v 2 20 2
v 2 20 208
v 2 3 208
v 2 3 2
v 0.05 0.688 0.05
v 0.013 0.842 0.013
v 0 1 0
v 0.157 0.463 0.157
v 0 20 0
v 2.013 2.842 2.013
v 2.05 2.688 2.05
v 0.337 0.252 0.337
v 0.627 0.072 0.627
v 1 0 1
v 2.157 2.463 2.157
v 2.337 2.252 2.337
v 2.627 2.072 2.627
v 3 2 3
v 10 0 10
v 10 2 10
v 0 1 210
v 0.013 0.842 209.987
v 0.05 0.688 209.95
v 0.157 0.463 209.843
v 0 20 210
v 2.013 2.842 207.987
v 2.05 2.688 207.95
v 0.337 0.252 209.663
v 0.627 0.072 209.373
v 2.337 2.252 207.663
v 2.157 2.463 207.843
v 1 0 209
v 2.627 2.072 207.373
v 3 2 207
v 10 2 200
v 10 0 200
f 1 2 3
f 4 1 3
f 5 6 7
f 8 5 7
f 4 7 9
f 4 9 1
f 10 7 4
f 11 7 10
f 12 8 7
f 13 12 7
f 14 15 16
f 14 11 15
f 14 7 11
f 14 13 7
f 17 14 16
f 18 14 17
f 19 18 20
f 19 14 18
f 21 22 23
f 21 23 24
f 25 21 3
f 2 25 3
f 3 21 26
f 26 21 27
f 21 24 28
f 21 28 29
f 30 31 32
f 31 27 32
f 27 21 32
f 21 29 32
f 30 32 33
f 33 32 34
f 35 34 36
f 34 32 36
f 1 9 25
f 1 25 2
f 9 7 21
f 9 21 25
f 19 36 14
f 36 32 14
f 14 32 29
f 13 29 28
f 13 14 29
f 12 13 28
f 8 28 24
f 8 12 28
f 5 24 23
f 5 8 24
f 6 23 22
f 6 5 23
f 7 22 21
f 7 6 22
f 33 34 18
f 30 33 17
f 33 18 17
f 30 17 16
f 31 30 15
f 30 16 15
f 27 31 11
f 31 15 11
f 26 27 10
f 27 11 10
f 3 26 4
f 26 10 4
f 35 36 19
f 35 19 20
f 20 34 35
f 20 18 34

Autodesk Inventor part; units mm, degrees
ref_plane "YZ Plane" through (0, 0, 0) normal (1, 0, 0) x (0, 1, 0)
ref_plane "XZ Plane" through (0, 0, 0) normal (0, 1, 0) x (-1, 0, 0)
ref_plane "XY Plane" through (0, 0, 0) normal (0, 0, 1) x (1, 0, 0)
sketch "Szkic1" plane through (0, 0, 0) normal (0, 0, 1) x (1, 0, 0)
  line L0 (-2.2485, 0) -> (12.0414, 0) projected
  line L1 (0, -4.2485) -> (0, 24.0414) projected
  line L2 (10, 0) -> (1, 0)
  line L3 (0, 1) -> (0, 20)
  line L4 (2, 20) -> (2, 3)
  line L5 (3, 2) -> (10, 2)
  line L6 (0, 20) -> (2, 20)
  line L7 (10, 0) -> (10, 2)
  arc A0 (2, 3) -> (3, 2) centre (3, 3) ccw
  arc A1 (0, 1) -> (1, 0) centre (1, 1) ccw
  point P0 (0, 0)
  dimension "d0" = 20
  dimension "d1" = 10
  dimension "d2" = 2
  dimension "d3" = 1
extrude "Wyciągnięcie proste1" add sketch "Szkic1" along normal blind 210 contours A1 L1 L6 L4 A0 L5 L7 L0
sketch "Szkic2" plane through (1, 0, 0) normal (0, -1, 0) x (1, 0, 0)
  line L0 (0, 0) -> (9, 0) projected
  line L1 (9, 0) -> (9, 210) projected
  line L2 (0, 210) -> (9, 210) projected
  line L3 (-1, 0) -> (-1, 210) projected
  line L4 (-1, 210) -> (9, 200)
  line L5 (9, 200) -> (9, 210)
  line L6 (9, 210) -> (-1, 210)
  line L7 (-1, 0) -> (9, 10)
  line L8 (9, 10) -> (9, 0)
  line L9 (9, 0) -> (-1, 0)
  dimension "d6" = 135
  dimension "d7" = 45
extrude "Wyciągnięcie proste2" cut sketch "Szkic2" against normal through all contours L9 L7 L1 L0 | L6 L2 L1 L4
properties part number "kątownik_mały2" material "Aluminium 6061"
